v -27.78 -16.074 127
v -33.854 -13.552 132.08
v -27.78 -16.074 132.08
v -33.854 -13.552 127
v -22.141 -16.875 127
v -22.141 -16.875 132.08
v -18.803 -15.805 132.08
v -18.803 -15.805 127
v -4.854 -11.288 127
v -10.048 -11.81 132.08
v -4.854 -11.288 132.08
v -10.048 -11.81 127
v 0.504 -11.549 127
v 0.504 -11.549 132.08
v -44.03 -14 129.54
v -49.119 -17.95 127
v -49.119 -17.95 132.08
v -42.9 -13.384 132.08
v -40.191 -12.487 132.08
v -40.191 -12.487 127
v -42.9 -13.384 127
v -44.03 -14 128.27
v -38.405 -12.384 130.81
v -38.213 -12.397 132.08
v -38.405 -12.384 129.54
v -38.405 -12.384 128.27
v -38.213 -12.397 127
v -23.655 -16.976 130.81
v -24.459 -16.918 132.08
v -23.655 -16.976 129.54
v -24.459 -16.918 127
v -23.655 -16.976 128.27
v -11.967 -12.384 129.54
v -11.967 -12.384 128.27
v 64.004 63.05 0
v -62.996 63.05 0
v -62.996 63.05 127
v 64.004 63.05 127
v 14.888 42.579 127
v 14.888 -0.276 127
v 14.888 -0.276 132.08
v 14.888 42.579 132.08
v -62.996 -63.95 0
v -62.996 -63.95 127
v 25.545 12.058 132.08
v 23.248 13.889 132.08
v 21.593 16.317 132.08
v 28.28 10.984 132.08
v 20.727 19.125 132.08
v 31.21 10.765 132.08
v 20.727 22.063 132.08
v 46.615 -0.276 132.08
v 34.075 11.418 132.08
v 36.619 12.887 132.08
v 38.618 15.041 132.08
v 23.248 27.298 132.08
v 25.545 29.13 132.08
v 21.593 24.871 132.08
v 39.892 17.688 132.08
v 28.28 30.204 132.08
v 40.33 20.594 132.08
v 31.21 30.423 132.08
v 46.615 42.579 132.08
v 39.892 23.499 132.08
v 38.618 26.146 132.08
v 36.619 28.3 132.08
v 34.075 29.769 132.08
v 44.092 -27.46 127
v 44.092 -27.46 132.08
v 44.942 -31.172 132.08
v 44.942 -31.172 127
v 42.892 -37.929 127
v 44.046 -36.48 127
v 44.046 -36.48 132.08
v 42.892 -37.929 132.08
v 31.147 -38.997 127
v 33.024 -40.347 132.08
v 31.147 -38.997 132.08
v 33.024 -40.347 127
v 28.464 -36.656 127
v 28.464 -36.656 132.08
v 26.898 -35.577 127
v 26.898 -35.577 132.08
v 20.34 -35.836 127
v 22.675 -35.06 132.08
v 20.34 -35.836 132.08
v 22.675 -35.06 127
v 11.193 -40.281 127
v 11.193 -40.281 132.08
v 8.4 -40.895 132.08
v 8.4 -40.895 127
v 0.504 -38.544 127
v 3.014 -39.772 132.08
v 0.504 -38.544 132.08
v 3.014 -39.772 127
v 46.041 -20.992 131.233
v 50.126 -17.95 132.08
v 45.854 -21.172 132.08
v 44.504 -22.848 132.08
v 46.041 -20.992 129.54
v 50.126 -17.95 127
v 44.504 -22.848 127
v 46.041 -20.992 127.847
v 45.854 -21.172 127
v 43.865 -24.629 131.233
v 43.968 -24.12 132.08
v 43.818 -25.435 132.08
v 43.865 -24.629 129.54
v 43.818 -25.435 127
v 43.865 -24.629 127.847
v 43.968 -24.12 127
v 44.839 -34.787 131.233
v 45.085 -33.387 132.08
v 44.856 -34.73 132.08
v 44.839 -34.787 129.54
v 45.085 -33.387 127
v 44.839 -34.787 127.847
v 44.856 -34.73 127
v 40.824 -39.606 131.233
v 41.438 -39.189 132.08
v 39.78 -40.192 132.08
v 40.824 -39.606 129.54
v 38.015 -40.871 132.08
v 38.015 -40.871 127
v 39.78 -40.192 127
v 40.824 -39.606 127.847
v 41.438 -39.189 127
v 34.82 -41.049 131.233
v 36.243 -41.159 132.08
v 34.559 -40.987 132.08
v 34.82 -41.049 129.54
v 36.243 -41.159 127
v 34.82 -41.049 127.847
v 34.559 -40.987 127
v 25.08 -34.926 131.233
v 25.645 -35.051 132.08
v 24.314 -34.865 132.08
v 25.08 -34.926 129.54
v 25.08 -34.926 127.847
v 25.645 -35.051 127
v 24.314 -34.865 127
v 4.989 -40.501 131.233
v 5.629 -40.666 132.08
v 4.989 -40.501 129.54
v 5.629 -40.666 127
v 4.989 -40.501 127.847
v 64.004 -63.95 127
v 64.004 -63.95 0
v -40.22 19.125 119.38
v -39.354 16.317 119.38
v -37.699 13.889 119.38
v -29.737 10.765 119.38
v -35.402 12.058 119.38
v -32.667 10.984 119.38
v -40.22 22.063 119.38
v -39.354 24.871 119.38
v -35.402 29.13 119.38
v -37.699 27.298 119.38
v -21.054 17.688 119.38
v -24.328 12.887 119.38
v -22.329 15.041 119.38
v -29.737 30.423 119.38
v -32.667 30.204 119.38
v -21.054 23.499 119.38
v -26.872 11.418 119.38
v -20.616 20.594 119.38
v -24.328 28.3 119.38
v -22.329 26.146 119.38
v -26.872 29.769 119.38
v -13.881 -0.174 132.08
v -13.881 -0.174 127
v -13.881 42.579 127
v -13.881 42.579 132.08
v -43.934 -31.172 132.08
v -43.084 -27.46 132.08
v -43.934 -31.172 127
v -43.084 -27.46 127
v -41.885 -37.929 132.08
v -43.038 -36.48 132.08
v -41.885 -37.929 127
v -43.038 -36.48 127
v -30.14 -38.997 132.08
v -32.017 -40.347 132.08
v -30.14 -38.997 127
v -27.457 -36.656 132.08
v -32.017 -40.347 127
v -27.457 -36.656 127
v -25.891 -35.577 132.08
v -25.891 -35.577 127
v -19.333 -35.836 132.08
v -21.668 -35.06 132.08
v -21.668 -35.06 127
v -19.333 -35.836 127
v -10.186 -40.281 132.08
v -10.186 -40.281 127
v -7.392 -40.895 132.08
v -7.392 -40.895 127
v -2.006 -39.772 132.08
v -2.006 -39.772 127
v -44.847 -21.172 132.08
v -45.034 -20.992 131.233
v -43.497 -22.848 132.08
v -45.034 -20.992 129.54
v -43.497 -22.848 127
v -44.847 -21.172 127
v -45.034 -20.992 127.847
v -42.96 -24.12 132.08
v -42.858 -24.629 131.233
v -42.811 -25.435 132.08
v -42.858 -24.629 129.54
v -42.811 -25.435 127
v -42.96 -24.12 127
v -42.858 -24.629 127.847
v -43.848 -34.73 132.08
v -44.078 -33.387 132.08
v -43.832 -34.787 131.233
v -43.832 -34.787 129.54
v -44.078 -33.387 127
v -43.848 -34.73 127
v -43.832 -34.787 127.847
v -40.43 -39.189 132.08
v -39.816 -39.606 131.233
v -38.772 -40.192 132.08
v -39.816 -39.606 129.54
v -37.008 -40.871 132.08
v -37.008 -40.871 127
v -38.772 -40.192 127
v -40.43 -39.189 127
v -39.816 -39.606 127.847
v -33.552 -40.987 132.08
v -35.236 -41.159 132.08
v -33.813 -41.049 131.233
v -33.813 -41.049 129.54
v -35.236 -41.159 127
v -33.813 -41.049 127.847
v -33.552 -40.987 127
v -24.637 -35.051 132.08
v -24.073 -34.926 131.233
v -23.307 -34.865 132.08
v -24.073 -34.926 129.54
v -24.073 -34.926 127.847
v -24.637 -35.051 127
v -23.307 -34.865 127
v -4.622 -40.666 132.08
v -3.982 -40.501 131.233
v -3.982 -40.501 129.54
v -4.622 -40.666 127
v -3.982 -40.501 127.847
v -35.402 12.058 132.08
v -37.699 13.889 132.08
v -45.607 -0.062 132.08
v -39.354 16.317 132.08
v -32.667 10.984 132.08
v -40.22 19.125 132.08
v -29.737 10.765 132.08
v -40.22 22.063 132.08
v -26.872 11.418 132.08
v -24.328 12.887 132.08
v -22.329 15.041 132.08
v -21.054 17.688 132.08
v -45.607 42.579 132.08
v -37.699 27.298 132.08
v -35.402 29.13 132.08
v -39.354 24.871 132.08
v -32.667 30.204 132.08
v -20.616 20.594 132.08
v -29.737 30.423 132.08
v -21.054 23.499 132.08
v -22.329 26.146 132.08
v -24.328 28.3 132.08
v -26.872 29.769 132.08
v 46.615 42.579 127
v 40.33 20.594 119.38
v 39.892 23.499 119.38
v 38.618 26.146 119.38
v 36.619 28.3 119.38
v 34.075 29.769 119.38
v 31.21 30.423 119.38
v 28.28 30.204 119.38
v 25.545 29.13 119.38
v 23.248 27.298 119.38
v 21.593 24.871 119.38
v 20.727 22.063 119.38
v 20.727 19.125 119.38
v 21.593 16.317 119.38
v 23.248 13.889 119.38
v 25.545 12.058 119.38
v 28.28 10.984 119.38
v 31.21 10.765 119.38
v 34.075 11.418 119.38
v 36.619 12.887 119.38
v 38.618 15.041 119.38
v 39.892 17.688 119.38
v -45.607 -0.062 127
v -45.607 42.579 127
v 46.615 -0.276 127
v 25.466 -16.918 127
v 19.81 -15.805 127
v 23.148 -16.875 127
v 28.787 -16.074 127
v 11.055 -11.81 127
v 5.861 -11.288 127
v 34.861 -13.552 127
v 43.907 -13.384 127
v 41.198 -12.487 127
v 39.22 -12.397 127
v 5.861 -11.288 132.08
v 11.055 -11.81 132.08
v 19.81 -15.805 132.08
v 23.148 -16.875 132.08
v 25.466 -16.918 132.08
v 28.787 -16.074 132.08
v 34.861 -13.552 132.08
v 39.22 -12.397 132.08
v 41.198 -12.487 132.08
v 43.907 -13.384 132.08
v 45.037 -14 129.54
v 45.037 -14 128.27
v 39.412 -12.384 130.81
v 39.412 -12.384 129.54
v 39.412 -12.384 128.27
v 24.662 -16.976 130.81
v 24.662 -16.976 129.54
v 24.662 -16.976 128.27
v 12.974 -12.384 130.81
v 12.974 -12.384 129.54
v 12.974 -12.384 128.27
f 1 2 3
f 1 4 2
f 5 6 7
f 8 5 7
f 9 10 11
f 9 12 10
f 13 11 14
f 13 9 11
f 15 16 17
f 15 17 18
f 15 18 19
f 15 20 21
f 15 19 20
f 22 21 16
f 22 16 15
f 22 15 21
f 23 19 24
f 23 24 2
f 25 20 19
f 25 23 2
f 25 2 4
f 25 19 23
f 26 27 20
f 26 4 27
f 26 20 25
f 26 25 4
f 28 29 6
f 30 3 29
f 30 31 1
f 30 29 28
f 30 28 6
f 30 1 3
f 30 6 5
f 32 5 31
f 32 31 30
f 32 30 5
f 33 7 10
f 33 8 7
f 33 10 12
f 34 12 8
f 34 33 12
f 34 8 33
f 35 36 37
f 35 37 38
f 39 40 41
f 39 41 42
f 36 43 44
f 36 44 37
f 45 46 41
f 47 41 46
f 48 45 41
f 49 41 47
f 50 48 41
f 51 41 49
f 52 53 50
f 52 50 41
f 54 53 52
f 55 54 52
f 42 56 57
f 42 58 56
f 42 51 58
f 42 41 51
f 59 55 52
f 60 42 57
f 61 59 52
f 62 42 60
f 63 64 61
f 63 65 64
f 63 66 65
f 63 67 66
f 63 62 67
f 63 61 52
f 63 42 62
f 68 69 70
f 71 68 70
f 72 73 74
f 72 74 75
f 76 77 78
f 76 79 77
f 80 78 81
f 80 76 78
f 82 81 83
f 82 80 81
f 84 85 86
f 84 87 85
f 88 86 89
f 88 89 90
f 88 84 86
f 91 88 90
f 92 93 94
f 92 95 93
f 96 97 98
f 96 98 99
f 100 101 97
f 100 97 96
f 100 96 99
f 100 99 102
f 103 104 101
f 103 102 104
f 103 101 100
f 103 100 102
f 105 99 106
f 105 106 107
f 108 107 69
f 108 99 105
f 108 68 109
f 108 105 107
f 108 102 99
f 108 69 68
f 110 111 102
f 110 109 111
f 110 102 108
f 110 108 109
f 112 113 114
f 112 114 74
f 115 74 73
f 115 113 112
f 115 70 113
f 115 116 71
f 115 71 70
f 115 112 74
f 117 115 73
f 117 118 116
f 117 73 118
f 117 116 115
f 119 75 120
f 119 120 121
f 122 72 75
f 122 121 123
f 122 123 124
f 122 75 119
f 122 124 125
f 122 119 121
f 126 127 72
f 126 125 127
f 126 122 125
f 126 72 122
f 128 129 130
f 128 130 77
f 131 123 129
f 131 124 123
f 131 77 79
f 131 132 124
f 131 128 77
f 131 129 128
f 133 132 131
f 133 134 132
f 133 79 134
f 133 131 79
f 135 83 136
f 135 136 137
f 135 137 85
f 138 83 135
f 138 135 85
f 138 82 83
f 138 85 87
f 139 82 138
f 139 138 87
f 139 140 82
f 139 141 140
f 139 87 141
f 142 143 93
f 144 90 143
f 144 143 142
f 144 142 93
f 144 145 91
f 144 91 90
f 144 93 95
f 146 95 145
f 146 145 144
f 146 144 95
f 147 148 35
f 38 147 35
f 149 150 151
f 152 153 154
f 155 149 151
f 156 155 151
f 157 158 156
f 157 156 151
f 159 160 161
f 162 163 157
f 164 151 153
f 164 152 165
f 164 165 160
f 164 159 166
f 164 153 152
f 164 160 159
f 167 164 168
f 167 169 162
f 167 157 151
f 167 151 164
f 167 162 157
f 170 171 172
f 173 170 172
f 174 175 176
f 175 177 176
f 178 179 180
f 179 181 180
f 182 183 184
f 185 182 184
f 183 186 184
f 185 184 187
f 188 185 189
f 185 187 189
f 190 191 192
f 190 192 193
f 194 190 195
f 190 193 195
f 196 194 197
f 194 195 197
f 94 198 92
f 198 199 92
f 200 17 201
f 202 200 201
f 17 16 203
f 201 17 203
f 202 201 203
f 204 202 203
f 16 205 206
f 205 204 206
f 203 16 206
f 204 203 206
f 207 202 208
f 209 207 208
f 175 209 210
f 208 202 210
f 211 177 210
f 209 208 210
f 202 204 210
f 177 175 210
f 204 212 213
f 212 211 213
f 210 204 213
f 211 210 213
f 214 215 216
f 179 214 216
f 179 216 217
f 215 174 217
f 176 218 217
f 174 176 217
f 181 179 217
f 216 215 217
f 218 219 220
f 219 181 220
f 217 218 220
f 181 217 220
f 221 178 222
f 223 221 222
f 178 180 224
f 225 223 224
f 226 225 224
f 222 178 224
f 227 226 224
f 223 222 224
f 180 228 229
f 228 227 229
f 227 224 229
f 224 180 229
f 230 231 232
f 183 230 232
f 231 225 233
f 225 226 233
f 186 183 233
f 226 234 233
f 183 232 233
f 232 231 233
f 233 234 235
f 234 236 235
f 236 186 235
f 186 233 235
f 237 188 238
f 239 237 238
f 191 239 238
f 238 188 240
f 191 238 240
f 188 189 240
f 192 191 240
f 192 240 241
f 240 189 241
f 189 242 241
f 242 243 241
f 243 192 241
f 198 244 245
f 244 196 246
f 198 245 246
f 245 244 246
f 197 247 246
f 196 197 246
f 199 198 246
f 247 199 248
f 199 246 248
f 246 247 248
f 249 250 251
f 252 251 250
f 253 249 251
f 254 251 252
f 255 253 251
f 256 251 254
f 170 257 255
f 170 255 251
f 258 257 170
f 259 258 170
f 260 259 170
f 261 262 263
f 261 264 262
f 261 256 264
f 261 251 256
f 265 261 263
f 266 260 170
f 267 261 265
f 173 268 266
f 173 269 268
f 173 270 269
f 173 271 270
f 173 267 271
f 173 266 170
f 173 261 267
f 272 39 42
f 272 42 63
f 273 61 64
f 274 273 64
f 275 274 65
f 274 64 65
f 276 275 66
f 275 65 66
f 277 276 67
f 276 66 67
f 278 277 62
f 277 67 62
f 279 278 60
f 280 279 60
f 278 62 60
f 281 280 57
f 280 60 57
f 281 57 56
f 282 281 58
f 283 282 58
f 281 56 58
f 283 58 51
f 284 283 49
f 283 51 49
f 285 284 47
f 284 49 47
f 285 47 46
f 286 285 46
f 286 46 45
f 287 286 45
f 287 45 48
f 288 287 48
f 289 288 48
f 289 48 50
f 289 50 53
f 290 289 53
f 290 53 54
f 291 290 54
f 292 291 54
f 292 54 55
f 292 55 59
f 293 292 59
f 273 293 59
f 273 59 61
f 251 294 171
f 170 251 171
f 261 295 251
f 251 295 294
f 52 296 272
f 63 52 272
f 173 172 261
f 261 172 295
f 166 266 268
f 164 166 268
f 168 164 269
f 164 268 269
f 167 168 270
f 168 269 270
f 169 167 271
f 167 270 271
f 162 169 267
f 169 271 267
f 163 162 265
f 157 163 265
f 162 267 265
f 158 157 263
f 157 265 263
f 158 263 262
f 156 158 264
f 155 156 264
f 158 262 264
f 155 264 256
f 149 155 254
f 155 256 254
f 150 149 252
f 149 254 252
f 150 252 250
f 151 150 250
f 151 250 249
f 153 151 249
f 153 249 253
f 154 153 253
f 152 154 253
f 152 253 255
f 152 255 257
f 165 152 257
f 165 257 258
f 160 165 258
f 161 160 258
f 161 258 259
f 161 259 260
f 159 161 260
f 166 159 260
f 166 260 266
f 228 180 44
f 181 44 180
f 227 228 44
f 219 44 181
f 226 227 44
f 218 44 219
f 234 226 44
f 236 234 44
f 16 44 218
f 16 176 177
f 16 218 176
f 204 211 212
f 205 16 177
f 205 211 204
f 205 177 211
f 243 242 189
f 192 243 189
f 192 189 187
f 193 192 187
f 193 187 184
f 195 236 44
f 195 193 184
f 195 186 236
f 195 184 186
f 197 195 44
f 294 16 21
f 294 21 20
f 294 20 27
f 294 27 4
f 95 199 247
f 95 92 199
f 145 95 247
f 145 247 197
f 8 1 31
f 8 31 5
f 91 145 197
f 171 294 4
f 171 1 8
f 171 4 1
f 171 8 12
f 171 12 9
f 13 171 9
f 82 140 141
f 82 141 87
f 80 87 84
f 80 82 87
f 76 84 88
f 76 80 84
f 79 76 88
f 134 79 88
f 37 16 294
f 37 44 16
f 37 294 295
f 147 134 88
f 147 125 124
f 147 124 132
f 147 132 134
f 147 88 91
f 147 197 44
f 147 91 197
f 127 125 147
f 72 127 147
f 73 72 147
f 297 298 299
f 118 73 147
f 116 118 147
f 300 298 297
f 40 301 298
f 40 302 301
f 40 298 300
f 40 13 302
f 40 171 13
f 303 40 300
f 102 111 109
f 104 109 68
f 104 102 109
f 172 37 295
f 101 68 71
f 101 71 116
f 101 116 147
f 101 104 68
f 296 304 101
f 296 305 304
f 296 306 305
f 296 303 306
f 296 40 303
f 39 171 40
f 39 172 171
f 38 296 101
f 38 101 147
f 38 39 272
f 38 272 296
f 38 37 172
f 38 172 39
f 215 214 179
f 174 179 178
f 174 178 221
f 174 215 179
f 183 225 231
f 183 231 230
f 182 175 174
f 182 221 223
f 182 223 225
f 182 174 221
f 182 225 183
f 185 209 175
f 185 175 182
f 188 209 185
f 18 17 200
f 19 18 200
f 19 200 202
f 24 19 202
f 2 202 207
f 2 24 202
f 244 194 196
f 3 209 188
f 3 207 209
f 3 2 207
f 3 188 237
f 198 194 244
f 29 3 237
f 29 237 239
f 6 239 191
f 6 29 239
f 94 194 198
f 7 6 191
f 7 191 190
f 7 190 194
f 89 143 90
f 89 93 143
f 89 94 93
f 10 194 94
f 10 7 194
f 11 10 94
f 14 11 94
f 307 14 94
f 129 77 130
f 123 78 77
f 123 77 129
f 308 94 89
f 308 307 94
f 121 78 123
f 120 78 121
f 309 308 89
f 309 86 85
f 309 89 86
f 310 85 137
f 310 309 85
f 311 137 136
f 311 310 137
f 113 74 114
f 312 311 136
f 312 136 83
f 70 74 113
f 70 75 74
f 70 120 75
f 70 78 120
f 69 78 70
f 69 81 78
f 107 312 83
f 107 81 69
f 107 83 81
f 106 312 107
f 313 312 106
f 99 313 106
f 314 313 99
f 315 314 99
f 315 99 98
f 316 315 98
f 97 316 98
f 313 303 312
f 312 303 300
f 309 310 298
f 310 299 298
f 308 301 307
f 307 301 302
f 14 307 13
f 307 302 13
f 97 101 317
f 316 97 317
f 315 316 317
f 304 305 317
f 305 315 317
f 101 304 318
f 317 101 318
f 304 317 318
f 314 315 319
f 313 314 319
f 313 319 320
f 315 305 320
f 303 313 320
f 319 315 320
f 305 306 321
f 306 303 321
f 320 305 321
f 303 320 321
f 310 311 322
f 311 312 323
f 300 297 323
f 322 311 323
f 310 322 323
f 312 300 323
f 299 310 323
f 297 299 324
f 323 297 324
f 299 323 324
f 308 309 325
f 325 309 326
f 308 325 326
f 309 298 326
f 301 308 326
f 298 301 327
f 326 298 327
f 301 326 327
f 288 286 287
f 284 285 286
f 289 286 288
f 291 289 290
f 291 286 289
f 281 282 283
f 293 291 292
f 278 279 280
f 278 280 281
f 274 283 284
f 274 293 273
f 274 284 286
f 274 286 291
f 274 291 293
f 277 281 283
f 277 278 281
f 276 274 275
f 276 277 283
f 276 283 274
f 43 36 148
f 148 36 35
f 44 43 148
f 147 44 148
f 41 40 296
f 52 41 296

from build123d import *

# Parameters (mm, degrees)
F0_W     = 127
F0_H     = 127
F1_DEPTH = 127
F2_W     = 31.7266828096
F2_H     = 42.8551162527
F3_DEPTH = 5.08
F6_R     = 9.8569317774
F7_DEPTH = 165.1


with BuildPart() as f1:
    # F0 (on Top) → F1 (new body)
    with BuildSketch(Plane.XY):
        with Locations((0.5035735936, -0.4498548806)):
            Rectangle(F0_W, F0_H)
    extrude(amount=F1_DEPTH)

    # F2 (on face) → F3 (join)
    with BuildSketch(Plane.XY.offset(127)):
        Polygon((-45.6073767898, -0.0615948727), (-13.8806939801, -0.1739759996), (-13.8806939801, 42.5792373717), (-45.6073767898, 42.5792373717), align=None)
        with Locations((30.7511825722, 21.1516792453)):
            Rectangle(F2_W, F2_H)
        with BuildLine():
            add(Edge.make_bspline(
                [(50.1263291183, -17.9500691593), (46.7932820736, -15.0577623363), (39.6901265176, -8.8938813577), (24.3847915396, -20.6711745873), (13.3519348493, -10.6155139904), (4.7829499351, -11.2382657266), (0.5035735936, -11.5492697805)],
                knots=[0, 0, 0, 0, 0.2398997898, 0.5112575675, 0.7559205876, 1, 1, 1, 1], degree=3))
            Line((0.5035735936, -11.5492697805), (0.5035735936, -38.543947041))
            add(Edge.make_bspline(
                [(50.1263291183, -17.9500691593), (47.1905685422, -19.9119433554), (41.1553991203, -23.945052613), (48.4880810339, -35.413097395), (33.5272000122, -45.1151840091), (25.8738069034, -29.8543925404), (10.1093672502, -43.4916081263), (3.4299860195, -40.0512557962), (0.5035735936, -38.543947041)],
                knots=[0, 0, 0, 0, 0.1499027043, 0.3081614436, 0.4784483834, 0.6464885348, 0.8451173382, 1, 1, 1, 1], degree=3))
        make_face()
        with BuildLine():
            Line((0.5035735936, -38.543947041), (0.5035735936, -11.5492697805))
            add(Edge.make_bspline(
                [(-49.119181931, -17.9500691593), (-45.7861348863, -15.0577623363), (-38.6829793303, -8.8938813577), (-23.3776443523, -20.6711745873), (-12.344787662, -10.6155139904), (-3.7758027479, -11.2382657266), (0.5035735936, -11.5492697805)],
                knots=[0, 0, 0, 0, 0.2398997898, 0.5112575675, 0.7559205876, 1, 1, 1, 1], degree=3))
            add(Edge.make_bspline(
                [(-49.119181931, -17.9500691593), (-46.1834213549, -19.9119433554), (-40.148251933, -23.945052613), (-47.4809338466, -35.413097395), (-32.5200528249, -45.1151840091), (-24.8666597161, -29.8543925404), (-9.1022200629, -43.4916081263), (-2.4228388322, -40.0512557962), (0.5035735936, -38.543947041)],
                knots=[0, 0, 0, 0, 0.1499027043, 0.3081614436, 0.4784483834, 0.6464885348, 0.8451173382, 1, 1, 1, 1], degree=3))
        make_face()
    extrude(amount=F3_DEPTH)

    # F6 (on offset) → F7 (cut)
    with BuildSketch(Plane.XY.offset(284.48)):
        with Locations((-30.4733738303, 20.5938778818)):
            Circle(F6_R)
        with Locations((30.4733738303, 20.5938778818)):
            Circle(F6_R)
    extrude(amount=-F7_DEPTH, mode=Mode.SUBTRACT)


solid = f1.part
